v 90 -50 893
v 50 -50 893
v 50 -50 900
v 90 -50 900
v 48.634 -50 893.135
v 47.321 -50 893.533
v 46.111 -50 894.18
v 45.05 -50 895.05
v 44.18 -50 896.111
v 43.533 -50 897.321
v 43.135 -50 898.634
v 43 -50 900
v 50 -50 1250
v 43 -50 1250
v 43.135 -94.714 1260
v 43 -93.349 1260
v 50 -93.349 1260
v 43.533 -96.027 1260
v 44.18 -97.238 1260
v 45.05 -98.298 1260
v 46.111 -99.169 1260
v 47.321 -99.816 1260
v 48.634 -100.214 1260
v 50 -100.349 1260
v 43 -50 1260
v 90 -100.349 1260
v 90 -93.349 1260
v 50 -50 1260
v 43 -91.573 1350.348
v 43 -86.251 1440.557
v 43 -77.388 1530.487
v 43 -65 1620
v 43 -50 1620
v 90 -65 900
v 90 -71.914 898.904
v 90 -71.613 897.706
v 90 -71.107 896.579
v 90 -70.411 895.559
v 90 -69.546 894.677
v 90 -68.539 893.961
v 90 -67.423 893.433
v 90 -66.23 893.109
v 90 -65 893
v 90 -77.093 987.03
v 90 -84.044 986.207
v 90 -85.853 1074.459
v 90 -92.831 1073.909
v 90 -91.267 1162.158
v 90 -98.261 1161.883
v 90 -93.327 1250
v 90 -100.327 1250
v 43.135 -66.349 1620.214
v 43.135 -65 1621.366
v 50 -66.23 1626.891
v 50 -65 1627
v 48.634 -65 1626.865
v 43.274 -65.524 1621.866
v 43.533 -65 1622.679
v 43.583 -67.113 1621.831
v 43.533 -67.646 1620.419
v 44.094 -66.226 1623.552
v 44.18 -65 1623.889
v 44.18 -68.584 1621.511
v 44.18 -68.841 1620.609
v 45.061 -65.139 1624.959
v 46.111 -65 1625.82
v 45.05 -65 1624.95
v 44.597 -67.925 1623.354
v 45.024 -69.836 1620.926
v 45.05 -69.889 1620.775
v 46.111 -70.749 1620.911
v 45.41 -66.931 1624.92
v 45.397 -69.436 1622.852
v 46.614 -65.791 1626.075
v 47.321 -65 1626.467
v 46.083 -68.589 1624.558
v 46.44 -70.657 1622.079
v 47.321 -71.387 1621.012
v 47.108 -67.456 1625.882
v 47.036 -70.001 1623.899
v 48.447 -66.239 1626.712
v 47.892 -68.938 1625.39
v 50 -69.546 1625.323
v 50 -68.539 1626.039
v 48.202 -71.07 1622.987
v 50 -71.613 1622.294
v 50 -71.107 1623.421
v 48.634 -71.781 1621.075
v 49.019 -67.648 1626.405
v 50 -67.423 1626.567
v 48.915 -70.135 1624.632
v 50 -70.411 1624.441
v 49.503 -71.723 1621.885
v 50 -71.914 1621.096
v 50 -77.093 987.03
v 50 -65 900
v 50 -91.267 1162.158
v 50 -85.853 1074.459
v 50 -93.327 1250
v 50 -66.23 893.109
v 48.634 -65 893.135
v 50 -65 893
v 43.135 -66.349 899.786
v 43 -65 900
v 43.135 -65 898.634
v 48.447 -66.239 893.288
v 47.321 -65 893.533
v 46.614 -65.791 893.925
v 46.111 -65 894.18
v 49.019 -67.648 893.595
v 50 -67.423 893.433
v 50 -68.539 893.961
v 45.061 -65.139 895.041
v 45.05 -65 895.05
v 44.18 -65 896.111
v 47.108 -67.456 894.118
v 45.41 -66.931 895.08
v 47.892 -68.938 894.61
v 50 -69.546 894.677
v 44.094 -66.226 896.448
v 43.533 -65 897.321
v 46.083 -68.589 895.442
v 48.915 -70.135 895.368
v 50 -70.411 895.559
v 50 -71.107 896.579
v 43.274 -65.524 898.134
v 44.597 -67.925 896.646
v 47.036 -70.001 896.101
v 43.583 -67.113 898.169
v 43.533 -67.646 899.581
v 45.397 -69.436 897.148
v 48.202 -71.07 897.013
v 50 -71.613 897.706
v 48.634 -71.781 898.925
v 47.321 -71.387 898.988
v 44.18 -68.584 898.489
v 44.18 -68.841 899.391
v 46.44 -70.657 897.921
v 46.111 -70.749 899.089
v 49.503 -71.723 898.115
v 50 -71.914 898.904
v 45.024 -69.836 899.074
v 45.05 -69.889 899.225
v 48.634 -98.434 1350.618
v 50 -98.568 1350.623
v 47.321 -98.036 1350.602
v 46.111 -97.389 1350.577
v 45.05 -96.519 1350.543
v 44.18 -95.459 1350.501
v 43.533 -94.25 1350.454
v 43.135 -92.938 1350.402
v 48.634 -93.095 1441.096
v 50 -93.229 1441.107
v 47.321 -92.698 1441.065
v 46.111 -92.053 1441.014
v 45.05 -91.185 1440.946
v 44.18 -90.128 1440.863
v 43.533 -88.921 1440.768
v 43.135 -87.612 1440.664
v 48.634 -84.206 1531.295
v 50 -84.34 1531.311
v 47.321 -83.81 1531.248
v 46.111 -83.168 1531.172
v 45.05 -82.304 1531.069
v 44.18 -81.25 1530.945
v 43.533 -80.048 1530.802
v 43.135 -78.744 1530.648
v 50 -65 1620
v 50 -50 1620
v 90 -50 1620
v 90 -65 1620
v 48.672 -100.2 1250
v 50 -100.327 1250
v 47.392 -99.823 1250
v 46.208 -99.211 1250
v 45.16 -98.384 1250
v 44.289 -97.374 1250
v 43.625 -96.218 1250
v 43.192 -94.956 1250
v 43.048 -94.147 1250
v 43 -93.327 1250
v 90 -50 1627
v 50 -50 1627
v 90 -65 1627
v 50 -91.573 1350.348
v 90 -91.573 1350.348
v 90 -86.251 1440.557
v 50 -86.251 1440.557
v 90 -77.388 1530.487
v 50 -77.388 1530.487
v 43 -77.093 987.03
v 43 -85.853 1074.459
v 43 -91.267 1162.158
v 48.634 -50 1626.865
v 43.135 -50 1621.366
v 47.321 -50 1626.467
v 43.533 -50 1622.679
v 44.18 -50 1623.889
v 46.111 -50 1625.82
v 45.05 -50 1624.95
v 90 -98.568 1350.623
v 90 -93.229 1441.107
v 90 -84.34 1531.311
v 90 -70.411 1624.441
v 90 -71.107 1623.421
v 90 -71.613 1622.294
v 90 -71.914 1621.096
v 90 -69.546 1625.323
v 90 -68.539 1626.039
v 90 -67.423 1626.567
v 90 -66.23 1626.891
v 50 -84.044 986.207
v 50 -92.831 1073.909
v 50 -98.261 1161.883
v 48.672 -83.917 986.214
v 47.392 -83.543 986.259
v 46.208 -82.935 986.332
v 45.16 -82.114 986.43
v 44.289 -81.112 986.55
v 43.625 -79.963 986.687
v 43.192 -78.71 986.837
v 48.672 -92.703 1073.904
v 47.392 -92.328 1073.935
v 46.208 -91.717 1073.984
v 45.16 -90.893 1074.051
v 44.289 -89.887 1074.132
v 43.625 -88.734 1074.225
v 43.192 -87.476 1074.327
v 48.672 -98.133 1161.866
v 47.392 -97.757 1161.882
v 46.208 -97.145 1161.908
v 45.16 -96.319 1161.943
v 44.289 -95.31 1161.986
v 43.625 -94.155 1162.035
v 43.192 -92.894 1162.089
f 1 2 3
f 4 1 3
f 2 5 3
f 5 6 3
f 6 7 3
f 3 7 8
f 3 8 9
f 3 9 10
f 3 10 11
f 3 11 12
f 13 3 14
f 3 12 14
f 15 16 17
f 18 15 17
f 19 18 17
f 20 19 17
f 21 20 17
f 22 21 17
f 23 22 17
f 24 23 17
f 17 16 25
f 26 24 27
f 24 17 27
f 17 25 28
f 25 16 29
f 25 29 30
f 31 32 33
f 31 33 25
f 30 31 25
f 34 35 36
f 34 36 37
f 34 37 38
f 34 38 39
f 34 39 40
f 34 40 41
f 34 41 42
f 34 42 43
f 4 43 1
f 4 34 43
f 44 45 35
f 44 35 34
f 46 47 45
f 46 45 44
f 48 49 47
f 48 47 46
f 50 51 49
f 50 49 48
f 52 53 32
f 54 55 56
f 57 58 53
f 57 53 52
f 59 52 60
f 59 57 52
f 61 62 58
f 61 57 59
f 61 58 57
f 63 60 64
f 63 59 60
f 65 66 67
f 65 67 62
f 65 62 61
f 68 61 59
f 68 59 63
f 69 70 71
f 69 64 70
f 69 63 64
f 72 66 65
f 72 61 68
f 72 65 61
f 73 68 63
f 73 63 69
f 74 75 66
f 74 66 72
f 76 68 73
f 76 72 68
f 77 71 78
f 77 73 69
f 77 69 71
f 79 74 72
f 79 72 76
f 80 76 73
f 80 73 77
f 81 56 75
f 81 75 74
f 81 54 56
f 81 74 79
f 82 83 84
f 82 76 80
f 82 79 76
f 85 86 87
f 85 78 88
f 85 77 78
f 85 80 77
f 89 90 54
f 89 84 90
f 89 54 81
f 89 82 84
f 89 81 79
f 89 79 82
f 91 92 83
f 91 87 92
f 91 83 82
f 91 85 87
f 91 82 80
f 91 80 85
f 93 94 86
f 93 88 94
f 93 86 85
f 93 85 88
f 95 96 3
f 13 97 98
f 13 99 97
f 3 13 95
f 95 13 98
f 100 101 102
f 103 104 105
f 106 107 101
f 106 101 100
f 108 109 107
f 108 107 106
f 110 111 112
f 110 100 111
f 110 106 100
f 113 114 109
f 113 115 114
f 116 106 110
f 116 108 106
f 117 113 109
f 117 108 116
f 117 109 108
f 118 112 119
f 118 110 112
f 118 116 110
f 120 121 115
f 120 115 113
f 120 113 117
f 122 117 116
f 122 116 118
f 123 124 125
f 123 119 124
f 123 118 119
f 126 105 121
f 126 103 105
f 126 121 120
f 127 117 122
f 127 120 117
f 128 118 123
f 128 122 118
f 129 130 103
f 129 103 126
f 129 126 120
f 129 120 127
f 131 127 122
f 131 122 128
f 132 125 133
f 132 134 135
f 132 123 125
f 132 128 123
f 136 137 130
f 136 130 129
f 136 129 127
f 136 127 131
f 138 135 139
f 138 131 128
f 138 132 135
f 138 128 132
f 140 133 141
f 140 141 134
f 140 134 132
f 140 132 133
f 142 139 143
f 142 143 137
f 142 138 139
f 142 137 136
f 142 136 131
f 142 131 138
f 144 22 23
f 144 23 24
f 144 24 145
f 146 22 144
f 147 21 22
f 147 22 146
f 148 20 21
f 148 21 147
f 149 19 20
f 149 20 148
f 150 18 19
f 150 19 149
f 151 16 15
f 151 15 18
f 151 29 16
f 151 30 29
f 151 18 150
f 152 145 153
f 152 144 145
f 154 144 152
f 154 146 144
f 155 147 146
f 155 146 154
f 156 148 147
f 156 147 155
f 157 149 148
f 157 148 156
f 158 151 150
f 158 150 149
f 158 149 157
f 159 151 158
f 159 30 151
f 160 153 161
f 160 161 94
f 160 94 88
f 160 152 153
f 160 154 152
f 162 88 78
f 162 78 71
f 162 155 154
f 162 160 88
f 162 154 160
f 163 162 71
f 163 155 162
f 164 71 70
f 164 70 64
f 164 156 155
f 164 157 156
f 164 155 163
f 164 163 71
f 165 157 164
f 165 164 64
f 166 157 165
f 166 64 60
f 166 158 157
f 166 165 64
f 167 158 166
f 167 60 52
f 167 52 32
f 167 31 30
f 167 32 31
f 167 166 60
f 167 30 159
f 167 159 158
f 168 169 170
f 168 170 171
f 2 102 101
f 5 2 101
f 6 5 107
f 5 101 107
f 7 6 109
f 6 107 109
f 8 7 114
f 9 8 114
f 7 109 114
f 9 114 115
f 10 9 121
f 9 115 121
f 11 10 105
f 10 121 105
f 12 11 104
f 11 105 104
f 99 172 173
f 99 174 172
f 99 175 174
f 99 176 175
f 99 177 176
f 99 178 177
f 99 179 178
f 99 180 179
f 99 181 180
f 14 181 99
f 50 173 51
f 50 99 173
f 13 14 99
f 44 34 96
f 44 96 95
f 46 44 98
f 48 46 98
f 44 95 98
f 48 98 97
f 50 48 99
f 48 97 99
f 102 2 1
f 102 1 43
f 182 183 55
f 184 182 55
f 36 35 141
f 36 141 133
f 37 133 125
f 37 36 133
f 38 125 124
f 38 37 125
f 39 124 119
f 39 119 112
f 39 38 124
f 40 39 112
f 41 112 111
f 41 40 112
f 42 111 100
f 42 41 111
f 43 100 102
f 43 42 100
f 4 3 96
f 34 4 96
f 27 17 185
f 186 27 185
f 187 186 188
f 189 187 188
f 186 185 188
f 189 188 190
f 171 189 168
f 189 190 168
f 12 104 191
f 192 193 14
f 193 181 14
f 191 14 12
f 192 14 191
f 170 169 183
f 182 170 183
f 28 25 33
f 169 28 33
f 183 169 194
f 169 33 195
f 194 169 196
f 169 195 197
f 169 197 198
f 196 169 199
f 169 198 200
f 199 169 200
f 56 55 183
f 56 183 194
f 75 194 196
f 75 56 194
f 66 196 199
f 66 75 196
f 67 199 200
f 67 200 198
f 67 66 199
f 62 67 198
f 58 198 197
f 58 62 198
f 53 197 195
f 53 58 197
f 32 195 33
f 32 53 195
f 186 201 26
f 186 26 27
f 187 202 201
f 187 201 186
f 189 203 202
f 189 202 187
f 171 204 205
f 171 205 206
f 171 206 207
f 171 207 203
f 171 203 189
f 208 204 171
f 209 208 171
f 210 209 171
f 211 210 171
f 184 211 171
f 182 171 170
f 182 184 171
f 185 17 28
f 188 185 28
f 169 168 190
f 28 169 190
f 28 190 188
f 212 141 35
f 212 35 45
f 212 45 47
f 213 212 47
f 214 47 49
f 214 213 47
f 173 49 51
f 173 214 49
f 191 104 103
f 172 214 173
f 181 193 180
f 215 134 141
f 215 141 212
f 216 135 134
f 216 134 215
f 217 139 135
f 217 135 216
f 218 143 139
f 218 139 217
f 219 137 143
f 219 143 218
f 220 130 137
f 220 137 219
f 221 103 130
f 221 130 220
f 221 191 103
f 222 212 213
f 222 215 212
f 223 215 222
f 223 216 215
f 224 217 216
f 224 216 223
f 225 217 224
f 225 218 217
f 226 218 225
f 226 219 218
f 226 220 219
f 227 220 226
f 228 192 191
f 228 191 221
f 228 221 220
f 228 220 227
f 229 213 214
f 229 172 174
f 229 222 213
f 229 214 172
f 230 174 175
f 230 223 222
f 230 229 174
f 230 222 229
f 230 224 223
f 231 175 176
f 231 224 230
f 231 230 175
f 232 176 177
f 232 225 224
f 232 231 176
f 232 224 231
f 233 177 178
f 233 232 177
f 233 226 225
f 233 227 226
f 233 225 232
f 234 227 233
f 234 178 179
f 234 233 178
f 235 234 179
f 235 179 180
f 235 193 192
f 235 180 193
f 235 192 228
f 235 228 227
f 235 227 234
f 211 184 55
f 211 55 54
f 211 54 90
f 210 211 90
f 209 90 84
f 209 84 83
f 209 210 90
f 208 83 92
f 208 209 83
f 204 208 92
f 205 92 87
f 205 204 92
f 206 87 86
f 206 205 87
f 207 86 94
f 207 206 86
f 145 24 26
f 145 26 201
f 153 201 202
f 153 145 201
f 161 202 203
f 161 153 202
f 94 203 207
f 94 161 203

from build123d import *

# Parameters (mm, degrees)
RECTANGLE_W               = 1217.787964
RECTANGLE_H               = 10
EXTRUDE008_DEPTH          = 150
EXTRUDE006_DEPTH          = 40
THICKNESS_T               = 7
THICKNESS_PLACEMENT_ANGLE = 180


with BuildPart() as extrude008:
    # Rectangle → Extrude008 (new body)
    with BuildSketch(Plane.XZ):
        with Locations((608.893982, 5)):
            Rectangle(RECTANGLE_W, RECTANGLE_H)
    extrude(amount=EXTRUDE008_DEPTH)


with BuildPart() as extrude008_1:
    # Extrude008 placement: moved
    add(extrude008.part.moved(Location((0, 0, 1250))))


with BuildPart() as cut001:
    # Sketch006 → Extrude006 (new body)
    with BuildSketch(Plane.YZ):
        with BuildLine():
            Line((0, 0), (0, 720))
            Line((0, 720), (15, 720))
            ThreePointArc((15, 0), (43.348618, 360), (15, 720))
            Line((0, 0), (15, 0))
        make_face()
    extrude(amount=-EXTRUDE006_DEPTH)

    # Thickness
    thickness_openings = [cut001.faces().sort_by_distance(p)[0] for p in [
        (-20, 0, 360),
        (-40, 18.01229, 360),
    ]]
    offset(amount=THICKNESS_T, openings=thickness_openings)


with BuildPart() as cut001_1:
    # Thickness placement: moved
    add(cut001.part.moved(Location((50, -50, 900))).rotate(Axis((50, -50, 900), (0, 0, -1)), THICKNESS_PLACEMENT_ANGLE))

    # Cut001: cut Extrude008
    add(extrude008_1.part, mode=Mode.SUBTRACT)


solid = cut001_1.part
